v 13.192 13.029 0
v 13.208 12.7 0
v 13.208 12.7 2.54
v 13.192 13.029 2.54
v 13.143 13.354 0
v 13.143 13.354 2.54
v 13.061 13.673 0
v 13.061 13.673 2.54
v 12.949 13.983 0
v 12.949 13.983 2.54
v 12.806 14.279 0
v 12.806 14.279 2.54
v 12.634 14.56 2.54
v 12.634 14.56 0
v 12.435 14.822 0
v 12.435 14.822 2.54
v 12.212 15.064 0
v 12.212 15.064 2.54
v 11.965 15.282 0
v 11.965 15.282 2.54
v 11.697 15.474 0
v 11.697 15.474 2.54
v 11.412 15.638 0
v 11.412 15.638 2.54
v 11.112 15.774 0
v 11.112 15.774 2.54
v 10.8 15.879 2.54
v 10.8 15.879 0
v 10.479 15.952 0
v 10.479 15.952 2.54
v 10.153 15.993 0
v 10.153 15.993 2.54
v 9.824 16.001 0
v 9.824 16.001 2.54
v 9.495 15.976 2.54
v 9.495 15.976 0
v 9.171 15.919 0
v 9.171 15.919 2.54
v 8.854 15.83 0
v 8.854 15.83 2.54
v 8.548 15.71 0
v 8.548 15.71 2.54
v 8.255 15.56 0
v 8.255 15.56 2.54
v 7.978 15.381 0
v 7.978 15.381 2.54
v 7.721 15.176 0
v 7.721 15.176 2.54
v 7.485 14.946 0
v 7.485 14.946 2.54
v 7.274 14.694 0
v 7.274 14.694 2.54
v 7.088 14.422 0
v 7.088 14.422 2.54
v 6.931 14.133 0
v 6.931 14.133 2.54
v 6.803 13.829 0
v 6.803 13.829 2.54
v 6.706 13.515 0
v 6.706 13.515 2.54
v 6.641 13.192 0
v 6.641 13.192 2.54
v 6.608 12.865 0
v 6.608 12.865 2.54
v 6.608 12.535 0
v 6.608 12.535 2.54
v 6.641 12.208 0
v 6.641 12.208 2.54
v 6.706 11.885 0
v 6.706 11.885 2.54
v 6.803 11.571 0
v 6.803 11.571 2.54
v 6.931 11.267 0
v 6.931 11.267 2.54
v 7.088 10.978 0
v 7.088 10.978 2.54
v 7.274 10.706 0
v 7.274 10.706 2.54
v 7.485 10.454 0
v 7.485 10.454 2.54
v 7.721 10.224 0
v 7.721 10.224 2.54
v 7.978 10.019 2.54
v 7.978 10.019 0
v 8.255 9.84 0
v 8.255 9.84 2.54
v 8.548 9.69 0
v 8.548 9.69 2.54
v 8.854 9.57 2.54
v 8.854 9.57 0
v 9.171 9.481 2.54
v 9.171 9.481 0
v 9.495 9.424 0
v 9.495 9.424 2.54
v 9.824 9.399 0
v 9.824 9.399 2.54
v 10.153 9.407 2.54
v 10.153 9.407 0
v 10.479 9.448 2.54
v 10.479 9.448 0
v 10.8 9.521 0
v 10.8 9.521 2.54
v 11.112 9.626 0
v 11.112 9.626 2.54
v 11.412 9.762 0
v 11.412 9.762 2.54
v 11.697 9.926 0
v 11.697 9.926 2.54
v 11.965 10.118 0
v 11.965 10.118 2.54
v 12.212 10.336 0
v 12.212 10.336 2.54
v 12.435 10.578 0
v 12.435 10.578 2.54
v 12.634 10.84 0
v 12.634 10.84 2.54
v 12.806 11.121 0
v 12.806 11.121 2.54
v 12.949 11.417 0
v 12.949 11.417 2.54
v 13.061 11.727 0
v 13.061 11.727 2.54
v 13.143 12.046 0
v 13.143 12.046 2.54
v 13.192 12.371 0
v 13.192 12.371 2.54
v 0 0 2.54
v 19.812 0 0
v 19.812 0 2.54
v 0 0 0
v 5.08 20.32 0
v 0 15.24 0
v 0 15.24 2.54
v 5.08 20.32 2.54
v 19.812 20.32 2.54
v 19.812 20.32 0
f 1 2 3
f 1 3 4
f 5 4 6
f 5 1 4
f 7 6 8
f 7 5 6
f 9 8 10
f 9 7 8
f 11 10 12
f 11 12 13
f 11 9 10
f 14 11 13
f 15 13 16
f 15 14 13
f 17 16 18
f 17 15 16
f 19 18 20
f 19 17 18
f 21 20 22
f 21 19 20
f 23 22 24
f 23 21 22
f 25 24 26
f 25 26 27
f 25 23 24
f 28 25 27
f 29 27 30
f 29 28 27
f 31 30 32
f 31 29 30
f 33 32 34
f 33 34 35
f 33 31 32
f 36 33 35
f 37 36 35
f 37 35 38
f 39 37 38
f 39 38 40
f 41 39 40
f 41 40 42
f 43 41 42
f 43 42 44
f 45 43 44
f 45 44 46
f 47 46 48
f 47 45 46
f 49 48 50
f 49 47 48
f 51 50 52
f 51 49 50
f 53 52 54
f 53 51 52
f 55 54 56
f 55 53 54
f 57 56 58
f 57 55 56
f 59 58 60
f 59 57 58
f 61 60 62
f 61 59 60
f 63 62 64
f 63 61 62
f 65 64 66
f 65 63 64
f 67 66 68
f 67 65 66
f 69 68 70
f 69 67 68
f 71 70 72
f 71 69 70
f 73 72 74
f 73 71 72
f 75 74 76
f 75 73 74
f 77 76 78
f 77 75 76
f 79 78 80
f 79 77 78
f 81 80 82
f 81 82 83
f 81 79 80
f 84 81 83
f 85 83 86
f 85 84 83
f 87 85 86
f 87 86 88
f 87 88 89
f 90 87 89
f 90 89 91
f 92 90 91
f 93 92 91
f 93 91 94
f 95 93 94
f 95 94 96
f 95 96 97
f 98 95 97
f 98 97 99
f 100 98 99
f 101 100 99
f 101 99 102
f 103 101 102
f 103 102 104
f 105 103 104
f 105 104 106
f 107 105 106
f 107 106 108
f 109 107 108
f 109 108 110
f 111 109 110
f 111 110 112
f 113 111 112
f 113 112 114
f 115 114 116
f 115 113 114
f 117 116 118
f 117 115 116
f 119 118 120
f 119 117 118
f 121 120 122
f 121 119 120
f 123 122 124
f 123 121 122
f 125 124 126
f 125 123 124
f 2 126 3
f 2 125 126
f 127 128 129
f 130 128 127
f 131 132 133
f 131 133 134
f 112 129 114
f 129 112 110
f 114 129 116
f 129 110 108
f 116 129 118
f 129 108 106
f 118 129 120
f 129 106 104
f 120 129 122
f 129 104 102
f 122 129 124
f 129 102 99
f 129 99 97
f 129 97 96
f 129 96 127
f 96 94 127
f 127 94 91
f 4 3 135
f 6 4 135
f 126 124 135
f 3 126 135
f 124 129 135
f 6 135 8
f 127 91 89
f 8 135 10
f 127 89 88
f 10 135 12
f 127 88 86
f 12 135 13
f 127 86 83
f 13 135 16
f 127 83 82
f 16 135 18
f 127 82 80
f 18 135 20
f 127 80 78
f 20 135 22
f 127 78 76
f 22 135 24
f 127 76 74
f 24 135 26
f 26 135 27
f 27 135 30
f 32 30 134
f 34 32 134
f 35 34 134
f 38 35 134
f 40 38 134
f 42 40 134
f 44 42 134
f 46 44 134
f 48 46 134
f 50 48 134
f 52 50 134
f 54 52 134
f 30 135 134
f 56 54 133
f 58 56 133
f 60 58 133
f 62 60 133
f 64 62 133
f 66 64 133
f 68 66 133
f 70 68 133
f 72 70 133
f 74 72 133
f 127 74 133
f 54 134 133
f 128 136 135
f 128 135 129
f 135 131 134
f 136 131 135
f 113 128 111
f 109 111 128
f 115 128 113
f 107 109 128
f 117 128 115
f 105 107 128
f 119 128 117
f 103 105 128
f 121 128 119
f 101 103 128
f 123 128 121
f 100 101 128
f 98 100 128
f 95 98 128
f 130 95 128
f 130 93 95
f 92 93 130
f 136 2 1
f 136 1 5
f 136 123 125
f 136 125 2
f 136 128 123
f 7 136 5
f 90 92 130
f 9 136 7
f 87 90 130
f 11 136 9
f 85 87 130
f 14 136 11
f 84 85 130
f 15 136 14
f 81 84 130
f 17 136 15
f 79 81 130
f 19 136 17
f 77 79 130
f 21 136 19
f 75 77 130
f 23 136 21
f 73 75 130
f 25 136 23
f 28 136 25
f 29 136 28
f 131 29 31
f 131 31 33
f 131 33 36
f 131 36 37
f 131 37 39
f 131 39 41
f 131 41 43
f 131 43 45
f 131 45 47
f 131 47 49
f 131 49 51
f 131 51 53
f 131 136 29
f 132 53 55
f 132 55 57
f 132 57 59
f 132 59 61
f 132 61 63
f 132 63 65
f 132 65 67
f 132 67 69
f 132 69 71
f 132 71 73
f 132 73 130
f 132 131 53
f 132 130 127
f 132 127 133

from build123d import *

# Parameters (mm, degrees)
SKETCH1_R           = 3.302
BOSS_EXTRUDE1_DEPTH = 2.54


with BuildPart() as part:
    # Sketch1 → Boss-Extrude1 (new body)
    with BuildSketch(Plane.XY):
        Polygon((0, 15.24), (5.08, 20.32), (19.812, 20.32), (19.812, 0), (0, 0), align=None)
        with Locations((9.906, 12.7)):
            Circle(SKETCH1_R, mode=Mode.SUBTRACT)
    extrude(amount=BOSS_EXTRUDE1_DEPTH)


solid = part.part
